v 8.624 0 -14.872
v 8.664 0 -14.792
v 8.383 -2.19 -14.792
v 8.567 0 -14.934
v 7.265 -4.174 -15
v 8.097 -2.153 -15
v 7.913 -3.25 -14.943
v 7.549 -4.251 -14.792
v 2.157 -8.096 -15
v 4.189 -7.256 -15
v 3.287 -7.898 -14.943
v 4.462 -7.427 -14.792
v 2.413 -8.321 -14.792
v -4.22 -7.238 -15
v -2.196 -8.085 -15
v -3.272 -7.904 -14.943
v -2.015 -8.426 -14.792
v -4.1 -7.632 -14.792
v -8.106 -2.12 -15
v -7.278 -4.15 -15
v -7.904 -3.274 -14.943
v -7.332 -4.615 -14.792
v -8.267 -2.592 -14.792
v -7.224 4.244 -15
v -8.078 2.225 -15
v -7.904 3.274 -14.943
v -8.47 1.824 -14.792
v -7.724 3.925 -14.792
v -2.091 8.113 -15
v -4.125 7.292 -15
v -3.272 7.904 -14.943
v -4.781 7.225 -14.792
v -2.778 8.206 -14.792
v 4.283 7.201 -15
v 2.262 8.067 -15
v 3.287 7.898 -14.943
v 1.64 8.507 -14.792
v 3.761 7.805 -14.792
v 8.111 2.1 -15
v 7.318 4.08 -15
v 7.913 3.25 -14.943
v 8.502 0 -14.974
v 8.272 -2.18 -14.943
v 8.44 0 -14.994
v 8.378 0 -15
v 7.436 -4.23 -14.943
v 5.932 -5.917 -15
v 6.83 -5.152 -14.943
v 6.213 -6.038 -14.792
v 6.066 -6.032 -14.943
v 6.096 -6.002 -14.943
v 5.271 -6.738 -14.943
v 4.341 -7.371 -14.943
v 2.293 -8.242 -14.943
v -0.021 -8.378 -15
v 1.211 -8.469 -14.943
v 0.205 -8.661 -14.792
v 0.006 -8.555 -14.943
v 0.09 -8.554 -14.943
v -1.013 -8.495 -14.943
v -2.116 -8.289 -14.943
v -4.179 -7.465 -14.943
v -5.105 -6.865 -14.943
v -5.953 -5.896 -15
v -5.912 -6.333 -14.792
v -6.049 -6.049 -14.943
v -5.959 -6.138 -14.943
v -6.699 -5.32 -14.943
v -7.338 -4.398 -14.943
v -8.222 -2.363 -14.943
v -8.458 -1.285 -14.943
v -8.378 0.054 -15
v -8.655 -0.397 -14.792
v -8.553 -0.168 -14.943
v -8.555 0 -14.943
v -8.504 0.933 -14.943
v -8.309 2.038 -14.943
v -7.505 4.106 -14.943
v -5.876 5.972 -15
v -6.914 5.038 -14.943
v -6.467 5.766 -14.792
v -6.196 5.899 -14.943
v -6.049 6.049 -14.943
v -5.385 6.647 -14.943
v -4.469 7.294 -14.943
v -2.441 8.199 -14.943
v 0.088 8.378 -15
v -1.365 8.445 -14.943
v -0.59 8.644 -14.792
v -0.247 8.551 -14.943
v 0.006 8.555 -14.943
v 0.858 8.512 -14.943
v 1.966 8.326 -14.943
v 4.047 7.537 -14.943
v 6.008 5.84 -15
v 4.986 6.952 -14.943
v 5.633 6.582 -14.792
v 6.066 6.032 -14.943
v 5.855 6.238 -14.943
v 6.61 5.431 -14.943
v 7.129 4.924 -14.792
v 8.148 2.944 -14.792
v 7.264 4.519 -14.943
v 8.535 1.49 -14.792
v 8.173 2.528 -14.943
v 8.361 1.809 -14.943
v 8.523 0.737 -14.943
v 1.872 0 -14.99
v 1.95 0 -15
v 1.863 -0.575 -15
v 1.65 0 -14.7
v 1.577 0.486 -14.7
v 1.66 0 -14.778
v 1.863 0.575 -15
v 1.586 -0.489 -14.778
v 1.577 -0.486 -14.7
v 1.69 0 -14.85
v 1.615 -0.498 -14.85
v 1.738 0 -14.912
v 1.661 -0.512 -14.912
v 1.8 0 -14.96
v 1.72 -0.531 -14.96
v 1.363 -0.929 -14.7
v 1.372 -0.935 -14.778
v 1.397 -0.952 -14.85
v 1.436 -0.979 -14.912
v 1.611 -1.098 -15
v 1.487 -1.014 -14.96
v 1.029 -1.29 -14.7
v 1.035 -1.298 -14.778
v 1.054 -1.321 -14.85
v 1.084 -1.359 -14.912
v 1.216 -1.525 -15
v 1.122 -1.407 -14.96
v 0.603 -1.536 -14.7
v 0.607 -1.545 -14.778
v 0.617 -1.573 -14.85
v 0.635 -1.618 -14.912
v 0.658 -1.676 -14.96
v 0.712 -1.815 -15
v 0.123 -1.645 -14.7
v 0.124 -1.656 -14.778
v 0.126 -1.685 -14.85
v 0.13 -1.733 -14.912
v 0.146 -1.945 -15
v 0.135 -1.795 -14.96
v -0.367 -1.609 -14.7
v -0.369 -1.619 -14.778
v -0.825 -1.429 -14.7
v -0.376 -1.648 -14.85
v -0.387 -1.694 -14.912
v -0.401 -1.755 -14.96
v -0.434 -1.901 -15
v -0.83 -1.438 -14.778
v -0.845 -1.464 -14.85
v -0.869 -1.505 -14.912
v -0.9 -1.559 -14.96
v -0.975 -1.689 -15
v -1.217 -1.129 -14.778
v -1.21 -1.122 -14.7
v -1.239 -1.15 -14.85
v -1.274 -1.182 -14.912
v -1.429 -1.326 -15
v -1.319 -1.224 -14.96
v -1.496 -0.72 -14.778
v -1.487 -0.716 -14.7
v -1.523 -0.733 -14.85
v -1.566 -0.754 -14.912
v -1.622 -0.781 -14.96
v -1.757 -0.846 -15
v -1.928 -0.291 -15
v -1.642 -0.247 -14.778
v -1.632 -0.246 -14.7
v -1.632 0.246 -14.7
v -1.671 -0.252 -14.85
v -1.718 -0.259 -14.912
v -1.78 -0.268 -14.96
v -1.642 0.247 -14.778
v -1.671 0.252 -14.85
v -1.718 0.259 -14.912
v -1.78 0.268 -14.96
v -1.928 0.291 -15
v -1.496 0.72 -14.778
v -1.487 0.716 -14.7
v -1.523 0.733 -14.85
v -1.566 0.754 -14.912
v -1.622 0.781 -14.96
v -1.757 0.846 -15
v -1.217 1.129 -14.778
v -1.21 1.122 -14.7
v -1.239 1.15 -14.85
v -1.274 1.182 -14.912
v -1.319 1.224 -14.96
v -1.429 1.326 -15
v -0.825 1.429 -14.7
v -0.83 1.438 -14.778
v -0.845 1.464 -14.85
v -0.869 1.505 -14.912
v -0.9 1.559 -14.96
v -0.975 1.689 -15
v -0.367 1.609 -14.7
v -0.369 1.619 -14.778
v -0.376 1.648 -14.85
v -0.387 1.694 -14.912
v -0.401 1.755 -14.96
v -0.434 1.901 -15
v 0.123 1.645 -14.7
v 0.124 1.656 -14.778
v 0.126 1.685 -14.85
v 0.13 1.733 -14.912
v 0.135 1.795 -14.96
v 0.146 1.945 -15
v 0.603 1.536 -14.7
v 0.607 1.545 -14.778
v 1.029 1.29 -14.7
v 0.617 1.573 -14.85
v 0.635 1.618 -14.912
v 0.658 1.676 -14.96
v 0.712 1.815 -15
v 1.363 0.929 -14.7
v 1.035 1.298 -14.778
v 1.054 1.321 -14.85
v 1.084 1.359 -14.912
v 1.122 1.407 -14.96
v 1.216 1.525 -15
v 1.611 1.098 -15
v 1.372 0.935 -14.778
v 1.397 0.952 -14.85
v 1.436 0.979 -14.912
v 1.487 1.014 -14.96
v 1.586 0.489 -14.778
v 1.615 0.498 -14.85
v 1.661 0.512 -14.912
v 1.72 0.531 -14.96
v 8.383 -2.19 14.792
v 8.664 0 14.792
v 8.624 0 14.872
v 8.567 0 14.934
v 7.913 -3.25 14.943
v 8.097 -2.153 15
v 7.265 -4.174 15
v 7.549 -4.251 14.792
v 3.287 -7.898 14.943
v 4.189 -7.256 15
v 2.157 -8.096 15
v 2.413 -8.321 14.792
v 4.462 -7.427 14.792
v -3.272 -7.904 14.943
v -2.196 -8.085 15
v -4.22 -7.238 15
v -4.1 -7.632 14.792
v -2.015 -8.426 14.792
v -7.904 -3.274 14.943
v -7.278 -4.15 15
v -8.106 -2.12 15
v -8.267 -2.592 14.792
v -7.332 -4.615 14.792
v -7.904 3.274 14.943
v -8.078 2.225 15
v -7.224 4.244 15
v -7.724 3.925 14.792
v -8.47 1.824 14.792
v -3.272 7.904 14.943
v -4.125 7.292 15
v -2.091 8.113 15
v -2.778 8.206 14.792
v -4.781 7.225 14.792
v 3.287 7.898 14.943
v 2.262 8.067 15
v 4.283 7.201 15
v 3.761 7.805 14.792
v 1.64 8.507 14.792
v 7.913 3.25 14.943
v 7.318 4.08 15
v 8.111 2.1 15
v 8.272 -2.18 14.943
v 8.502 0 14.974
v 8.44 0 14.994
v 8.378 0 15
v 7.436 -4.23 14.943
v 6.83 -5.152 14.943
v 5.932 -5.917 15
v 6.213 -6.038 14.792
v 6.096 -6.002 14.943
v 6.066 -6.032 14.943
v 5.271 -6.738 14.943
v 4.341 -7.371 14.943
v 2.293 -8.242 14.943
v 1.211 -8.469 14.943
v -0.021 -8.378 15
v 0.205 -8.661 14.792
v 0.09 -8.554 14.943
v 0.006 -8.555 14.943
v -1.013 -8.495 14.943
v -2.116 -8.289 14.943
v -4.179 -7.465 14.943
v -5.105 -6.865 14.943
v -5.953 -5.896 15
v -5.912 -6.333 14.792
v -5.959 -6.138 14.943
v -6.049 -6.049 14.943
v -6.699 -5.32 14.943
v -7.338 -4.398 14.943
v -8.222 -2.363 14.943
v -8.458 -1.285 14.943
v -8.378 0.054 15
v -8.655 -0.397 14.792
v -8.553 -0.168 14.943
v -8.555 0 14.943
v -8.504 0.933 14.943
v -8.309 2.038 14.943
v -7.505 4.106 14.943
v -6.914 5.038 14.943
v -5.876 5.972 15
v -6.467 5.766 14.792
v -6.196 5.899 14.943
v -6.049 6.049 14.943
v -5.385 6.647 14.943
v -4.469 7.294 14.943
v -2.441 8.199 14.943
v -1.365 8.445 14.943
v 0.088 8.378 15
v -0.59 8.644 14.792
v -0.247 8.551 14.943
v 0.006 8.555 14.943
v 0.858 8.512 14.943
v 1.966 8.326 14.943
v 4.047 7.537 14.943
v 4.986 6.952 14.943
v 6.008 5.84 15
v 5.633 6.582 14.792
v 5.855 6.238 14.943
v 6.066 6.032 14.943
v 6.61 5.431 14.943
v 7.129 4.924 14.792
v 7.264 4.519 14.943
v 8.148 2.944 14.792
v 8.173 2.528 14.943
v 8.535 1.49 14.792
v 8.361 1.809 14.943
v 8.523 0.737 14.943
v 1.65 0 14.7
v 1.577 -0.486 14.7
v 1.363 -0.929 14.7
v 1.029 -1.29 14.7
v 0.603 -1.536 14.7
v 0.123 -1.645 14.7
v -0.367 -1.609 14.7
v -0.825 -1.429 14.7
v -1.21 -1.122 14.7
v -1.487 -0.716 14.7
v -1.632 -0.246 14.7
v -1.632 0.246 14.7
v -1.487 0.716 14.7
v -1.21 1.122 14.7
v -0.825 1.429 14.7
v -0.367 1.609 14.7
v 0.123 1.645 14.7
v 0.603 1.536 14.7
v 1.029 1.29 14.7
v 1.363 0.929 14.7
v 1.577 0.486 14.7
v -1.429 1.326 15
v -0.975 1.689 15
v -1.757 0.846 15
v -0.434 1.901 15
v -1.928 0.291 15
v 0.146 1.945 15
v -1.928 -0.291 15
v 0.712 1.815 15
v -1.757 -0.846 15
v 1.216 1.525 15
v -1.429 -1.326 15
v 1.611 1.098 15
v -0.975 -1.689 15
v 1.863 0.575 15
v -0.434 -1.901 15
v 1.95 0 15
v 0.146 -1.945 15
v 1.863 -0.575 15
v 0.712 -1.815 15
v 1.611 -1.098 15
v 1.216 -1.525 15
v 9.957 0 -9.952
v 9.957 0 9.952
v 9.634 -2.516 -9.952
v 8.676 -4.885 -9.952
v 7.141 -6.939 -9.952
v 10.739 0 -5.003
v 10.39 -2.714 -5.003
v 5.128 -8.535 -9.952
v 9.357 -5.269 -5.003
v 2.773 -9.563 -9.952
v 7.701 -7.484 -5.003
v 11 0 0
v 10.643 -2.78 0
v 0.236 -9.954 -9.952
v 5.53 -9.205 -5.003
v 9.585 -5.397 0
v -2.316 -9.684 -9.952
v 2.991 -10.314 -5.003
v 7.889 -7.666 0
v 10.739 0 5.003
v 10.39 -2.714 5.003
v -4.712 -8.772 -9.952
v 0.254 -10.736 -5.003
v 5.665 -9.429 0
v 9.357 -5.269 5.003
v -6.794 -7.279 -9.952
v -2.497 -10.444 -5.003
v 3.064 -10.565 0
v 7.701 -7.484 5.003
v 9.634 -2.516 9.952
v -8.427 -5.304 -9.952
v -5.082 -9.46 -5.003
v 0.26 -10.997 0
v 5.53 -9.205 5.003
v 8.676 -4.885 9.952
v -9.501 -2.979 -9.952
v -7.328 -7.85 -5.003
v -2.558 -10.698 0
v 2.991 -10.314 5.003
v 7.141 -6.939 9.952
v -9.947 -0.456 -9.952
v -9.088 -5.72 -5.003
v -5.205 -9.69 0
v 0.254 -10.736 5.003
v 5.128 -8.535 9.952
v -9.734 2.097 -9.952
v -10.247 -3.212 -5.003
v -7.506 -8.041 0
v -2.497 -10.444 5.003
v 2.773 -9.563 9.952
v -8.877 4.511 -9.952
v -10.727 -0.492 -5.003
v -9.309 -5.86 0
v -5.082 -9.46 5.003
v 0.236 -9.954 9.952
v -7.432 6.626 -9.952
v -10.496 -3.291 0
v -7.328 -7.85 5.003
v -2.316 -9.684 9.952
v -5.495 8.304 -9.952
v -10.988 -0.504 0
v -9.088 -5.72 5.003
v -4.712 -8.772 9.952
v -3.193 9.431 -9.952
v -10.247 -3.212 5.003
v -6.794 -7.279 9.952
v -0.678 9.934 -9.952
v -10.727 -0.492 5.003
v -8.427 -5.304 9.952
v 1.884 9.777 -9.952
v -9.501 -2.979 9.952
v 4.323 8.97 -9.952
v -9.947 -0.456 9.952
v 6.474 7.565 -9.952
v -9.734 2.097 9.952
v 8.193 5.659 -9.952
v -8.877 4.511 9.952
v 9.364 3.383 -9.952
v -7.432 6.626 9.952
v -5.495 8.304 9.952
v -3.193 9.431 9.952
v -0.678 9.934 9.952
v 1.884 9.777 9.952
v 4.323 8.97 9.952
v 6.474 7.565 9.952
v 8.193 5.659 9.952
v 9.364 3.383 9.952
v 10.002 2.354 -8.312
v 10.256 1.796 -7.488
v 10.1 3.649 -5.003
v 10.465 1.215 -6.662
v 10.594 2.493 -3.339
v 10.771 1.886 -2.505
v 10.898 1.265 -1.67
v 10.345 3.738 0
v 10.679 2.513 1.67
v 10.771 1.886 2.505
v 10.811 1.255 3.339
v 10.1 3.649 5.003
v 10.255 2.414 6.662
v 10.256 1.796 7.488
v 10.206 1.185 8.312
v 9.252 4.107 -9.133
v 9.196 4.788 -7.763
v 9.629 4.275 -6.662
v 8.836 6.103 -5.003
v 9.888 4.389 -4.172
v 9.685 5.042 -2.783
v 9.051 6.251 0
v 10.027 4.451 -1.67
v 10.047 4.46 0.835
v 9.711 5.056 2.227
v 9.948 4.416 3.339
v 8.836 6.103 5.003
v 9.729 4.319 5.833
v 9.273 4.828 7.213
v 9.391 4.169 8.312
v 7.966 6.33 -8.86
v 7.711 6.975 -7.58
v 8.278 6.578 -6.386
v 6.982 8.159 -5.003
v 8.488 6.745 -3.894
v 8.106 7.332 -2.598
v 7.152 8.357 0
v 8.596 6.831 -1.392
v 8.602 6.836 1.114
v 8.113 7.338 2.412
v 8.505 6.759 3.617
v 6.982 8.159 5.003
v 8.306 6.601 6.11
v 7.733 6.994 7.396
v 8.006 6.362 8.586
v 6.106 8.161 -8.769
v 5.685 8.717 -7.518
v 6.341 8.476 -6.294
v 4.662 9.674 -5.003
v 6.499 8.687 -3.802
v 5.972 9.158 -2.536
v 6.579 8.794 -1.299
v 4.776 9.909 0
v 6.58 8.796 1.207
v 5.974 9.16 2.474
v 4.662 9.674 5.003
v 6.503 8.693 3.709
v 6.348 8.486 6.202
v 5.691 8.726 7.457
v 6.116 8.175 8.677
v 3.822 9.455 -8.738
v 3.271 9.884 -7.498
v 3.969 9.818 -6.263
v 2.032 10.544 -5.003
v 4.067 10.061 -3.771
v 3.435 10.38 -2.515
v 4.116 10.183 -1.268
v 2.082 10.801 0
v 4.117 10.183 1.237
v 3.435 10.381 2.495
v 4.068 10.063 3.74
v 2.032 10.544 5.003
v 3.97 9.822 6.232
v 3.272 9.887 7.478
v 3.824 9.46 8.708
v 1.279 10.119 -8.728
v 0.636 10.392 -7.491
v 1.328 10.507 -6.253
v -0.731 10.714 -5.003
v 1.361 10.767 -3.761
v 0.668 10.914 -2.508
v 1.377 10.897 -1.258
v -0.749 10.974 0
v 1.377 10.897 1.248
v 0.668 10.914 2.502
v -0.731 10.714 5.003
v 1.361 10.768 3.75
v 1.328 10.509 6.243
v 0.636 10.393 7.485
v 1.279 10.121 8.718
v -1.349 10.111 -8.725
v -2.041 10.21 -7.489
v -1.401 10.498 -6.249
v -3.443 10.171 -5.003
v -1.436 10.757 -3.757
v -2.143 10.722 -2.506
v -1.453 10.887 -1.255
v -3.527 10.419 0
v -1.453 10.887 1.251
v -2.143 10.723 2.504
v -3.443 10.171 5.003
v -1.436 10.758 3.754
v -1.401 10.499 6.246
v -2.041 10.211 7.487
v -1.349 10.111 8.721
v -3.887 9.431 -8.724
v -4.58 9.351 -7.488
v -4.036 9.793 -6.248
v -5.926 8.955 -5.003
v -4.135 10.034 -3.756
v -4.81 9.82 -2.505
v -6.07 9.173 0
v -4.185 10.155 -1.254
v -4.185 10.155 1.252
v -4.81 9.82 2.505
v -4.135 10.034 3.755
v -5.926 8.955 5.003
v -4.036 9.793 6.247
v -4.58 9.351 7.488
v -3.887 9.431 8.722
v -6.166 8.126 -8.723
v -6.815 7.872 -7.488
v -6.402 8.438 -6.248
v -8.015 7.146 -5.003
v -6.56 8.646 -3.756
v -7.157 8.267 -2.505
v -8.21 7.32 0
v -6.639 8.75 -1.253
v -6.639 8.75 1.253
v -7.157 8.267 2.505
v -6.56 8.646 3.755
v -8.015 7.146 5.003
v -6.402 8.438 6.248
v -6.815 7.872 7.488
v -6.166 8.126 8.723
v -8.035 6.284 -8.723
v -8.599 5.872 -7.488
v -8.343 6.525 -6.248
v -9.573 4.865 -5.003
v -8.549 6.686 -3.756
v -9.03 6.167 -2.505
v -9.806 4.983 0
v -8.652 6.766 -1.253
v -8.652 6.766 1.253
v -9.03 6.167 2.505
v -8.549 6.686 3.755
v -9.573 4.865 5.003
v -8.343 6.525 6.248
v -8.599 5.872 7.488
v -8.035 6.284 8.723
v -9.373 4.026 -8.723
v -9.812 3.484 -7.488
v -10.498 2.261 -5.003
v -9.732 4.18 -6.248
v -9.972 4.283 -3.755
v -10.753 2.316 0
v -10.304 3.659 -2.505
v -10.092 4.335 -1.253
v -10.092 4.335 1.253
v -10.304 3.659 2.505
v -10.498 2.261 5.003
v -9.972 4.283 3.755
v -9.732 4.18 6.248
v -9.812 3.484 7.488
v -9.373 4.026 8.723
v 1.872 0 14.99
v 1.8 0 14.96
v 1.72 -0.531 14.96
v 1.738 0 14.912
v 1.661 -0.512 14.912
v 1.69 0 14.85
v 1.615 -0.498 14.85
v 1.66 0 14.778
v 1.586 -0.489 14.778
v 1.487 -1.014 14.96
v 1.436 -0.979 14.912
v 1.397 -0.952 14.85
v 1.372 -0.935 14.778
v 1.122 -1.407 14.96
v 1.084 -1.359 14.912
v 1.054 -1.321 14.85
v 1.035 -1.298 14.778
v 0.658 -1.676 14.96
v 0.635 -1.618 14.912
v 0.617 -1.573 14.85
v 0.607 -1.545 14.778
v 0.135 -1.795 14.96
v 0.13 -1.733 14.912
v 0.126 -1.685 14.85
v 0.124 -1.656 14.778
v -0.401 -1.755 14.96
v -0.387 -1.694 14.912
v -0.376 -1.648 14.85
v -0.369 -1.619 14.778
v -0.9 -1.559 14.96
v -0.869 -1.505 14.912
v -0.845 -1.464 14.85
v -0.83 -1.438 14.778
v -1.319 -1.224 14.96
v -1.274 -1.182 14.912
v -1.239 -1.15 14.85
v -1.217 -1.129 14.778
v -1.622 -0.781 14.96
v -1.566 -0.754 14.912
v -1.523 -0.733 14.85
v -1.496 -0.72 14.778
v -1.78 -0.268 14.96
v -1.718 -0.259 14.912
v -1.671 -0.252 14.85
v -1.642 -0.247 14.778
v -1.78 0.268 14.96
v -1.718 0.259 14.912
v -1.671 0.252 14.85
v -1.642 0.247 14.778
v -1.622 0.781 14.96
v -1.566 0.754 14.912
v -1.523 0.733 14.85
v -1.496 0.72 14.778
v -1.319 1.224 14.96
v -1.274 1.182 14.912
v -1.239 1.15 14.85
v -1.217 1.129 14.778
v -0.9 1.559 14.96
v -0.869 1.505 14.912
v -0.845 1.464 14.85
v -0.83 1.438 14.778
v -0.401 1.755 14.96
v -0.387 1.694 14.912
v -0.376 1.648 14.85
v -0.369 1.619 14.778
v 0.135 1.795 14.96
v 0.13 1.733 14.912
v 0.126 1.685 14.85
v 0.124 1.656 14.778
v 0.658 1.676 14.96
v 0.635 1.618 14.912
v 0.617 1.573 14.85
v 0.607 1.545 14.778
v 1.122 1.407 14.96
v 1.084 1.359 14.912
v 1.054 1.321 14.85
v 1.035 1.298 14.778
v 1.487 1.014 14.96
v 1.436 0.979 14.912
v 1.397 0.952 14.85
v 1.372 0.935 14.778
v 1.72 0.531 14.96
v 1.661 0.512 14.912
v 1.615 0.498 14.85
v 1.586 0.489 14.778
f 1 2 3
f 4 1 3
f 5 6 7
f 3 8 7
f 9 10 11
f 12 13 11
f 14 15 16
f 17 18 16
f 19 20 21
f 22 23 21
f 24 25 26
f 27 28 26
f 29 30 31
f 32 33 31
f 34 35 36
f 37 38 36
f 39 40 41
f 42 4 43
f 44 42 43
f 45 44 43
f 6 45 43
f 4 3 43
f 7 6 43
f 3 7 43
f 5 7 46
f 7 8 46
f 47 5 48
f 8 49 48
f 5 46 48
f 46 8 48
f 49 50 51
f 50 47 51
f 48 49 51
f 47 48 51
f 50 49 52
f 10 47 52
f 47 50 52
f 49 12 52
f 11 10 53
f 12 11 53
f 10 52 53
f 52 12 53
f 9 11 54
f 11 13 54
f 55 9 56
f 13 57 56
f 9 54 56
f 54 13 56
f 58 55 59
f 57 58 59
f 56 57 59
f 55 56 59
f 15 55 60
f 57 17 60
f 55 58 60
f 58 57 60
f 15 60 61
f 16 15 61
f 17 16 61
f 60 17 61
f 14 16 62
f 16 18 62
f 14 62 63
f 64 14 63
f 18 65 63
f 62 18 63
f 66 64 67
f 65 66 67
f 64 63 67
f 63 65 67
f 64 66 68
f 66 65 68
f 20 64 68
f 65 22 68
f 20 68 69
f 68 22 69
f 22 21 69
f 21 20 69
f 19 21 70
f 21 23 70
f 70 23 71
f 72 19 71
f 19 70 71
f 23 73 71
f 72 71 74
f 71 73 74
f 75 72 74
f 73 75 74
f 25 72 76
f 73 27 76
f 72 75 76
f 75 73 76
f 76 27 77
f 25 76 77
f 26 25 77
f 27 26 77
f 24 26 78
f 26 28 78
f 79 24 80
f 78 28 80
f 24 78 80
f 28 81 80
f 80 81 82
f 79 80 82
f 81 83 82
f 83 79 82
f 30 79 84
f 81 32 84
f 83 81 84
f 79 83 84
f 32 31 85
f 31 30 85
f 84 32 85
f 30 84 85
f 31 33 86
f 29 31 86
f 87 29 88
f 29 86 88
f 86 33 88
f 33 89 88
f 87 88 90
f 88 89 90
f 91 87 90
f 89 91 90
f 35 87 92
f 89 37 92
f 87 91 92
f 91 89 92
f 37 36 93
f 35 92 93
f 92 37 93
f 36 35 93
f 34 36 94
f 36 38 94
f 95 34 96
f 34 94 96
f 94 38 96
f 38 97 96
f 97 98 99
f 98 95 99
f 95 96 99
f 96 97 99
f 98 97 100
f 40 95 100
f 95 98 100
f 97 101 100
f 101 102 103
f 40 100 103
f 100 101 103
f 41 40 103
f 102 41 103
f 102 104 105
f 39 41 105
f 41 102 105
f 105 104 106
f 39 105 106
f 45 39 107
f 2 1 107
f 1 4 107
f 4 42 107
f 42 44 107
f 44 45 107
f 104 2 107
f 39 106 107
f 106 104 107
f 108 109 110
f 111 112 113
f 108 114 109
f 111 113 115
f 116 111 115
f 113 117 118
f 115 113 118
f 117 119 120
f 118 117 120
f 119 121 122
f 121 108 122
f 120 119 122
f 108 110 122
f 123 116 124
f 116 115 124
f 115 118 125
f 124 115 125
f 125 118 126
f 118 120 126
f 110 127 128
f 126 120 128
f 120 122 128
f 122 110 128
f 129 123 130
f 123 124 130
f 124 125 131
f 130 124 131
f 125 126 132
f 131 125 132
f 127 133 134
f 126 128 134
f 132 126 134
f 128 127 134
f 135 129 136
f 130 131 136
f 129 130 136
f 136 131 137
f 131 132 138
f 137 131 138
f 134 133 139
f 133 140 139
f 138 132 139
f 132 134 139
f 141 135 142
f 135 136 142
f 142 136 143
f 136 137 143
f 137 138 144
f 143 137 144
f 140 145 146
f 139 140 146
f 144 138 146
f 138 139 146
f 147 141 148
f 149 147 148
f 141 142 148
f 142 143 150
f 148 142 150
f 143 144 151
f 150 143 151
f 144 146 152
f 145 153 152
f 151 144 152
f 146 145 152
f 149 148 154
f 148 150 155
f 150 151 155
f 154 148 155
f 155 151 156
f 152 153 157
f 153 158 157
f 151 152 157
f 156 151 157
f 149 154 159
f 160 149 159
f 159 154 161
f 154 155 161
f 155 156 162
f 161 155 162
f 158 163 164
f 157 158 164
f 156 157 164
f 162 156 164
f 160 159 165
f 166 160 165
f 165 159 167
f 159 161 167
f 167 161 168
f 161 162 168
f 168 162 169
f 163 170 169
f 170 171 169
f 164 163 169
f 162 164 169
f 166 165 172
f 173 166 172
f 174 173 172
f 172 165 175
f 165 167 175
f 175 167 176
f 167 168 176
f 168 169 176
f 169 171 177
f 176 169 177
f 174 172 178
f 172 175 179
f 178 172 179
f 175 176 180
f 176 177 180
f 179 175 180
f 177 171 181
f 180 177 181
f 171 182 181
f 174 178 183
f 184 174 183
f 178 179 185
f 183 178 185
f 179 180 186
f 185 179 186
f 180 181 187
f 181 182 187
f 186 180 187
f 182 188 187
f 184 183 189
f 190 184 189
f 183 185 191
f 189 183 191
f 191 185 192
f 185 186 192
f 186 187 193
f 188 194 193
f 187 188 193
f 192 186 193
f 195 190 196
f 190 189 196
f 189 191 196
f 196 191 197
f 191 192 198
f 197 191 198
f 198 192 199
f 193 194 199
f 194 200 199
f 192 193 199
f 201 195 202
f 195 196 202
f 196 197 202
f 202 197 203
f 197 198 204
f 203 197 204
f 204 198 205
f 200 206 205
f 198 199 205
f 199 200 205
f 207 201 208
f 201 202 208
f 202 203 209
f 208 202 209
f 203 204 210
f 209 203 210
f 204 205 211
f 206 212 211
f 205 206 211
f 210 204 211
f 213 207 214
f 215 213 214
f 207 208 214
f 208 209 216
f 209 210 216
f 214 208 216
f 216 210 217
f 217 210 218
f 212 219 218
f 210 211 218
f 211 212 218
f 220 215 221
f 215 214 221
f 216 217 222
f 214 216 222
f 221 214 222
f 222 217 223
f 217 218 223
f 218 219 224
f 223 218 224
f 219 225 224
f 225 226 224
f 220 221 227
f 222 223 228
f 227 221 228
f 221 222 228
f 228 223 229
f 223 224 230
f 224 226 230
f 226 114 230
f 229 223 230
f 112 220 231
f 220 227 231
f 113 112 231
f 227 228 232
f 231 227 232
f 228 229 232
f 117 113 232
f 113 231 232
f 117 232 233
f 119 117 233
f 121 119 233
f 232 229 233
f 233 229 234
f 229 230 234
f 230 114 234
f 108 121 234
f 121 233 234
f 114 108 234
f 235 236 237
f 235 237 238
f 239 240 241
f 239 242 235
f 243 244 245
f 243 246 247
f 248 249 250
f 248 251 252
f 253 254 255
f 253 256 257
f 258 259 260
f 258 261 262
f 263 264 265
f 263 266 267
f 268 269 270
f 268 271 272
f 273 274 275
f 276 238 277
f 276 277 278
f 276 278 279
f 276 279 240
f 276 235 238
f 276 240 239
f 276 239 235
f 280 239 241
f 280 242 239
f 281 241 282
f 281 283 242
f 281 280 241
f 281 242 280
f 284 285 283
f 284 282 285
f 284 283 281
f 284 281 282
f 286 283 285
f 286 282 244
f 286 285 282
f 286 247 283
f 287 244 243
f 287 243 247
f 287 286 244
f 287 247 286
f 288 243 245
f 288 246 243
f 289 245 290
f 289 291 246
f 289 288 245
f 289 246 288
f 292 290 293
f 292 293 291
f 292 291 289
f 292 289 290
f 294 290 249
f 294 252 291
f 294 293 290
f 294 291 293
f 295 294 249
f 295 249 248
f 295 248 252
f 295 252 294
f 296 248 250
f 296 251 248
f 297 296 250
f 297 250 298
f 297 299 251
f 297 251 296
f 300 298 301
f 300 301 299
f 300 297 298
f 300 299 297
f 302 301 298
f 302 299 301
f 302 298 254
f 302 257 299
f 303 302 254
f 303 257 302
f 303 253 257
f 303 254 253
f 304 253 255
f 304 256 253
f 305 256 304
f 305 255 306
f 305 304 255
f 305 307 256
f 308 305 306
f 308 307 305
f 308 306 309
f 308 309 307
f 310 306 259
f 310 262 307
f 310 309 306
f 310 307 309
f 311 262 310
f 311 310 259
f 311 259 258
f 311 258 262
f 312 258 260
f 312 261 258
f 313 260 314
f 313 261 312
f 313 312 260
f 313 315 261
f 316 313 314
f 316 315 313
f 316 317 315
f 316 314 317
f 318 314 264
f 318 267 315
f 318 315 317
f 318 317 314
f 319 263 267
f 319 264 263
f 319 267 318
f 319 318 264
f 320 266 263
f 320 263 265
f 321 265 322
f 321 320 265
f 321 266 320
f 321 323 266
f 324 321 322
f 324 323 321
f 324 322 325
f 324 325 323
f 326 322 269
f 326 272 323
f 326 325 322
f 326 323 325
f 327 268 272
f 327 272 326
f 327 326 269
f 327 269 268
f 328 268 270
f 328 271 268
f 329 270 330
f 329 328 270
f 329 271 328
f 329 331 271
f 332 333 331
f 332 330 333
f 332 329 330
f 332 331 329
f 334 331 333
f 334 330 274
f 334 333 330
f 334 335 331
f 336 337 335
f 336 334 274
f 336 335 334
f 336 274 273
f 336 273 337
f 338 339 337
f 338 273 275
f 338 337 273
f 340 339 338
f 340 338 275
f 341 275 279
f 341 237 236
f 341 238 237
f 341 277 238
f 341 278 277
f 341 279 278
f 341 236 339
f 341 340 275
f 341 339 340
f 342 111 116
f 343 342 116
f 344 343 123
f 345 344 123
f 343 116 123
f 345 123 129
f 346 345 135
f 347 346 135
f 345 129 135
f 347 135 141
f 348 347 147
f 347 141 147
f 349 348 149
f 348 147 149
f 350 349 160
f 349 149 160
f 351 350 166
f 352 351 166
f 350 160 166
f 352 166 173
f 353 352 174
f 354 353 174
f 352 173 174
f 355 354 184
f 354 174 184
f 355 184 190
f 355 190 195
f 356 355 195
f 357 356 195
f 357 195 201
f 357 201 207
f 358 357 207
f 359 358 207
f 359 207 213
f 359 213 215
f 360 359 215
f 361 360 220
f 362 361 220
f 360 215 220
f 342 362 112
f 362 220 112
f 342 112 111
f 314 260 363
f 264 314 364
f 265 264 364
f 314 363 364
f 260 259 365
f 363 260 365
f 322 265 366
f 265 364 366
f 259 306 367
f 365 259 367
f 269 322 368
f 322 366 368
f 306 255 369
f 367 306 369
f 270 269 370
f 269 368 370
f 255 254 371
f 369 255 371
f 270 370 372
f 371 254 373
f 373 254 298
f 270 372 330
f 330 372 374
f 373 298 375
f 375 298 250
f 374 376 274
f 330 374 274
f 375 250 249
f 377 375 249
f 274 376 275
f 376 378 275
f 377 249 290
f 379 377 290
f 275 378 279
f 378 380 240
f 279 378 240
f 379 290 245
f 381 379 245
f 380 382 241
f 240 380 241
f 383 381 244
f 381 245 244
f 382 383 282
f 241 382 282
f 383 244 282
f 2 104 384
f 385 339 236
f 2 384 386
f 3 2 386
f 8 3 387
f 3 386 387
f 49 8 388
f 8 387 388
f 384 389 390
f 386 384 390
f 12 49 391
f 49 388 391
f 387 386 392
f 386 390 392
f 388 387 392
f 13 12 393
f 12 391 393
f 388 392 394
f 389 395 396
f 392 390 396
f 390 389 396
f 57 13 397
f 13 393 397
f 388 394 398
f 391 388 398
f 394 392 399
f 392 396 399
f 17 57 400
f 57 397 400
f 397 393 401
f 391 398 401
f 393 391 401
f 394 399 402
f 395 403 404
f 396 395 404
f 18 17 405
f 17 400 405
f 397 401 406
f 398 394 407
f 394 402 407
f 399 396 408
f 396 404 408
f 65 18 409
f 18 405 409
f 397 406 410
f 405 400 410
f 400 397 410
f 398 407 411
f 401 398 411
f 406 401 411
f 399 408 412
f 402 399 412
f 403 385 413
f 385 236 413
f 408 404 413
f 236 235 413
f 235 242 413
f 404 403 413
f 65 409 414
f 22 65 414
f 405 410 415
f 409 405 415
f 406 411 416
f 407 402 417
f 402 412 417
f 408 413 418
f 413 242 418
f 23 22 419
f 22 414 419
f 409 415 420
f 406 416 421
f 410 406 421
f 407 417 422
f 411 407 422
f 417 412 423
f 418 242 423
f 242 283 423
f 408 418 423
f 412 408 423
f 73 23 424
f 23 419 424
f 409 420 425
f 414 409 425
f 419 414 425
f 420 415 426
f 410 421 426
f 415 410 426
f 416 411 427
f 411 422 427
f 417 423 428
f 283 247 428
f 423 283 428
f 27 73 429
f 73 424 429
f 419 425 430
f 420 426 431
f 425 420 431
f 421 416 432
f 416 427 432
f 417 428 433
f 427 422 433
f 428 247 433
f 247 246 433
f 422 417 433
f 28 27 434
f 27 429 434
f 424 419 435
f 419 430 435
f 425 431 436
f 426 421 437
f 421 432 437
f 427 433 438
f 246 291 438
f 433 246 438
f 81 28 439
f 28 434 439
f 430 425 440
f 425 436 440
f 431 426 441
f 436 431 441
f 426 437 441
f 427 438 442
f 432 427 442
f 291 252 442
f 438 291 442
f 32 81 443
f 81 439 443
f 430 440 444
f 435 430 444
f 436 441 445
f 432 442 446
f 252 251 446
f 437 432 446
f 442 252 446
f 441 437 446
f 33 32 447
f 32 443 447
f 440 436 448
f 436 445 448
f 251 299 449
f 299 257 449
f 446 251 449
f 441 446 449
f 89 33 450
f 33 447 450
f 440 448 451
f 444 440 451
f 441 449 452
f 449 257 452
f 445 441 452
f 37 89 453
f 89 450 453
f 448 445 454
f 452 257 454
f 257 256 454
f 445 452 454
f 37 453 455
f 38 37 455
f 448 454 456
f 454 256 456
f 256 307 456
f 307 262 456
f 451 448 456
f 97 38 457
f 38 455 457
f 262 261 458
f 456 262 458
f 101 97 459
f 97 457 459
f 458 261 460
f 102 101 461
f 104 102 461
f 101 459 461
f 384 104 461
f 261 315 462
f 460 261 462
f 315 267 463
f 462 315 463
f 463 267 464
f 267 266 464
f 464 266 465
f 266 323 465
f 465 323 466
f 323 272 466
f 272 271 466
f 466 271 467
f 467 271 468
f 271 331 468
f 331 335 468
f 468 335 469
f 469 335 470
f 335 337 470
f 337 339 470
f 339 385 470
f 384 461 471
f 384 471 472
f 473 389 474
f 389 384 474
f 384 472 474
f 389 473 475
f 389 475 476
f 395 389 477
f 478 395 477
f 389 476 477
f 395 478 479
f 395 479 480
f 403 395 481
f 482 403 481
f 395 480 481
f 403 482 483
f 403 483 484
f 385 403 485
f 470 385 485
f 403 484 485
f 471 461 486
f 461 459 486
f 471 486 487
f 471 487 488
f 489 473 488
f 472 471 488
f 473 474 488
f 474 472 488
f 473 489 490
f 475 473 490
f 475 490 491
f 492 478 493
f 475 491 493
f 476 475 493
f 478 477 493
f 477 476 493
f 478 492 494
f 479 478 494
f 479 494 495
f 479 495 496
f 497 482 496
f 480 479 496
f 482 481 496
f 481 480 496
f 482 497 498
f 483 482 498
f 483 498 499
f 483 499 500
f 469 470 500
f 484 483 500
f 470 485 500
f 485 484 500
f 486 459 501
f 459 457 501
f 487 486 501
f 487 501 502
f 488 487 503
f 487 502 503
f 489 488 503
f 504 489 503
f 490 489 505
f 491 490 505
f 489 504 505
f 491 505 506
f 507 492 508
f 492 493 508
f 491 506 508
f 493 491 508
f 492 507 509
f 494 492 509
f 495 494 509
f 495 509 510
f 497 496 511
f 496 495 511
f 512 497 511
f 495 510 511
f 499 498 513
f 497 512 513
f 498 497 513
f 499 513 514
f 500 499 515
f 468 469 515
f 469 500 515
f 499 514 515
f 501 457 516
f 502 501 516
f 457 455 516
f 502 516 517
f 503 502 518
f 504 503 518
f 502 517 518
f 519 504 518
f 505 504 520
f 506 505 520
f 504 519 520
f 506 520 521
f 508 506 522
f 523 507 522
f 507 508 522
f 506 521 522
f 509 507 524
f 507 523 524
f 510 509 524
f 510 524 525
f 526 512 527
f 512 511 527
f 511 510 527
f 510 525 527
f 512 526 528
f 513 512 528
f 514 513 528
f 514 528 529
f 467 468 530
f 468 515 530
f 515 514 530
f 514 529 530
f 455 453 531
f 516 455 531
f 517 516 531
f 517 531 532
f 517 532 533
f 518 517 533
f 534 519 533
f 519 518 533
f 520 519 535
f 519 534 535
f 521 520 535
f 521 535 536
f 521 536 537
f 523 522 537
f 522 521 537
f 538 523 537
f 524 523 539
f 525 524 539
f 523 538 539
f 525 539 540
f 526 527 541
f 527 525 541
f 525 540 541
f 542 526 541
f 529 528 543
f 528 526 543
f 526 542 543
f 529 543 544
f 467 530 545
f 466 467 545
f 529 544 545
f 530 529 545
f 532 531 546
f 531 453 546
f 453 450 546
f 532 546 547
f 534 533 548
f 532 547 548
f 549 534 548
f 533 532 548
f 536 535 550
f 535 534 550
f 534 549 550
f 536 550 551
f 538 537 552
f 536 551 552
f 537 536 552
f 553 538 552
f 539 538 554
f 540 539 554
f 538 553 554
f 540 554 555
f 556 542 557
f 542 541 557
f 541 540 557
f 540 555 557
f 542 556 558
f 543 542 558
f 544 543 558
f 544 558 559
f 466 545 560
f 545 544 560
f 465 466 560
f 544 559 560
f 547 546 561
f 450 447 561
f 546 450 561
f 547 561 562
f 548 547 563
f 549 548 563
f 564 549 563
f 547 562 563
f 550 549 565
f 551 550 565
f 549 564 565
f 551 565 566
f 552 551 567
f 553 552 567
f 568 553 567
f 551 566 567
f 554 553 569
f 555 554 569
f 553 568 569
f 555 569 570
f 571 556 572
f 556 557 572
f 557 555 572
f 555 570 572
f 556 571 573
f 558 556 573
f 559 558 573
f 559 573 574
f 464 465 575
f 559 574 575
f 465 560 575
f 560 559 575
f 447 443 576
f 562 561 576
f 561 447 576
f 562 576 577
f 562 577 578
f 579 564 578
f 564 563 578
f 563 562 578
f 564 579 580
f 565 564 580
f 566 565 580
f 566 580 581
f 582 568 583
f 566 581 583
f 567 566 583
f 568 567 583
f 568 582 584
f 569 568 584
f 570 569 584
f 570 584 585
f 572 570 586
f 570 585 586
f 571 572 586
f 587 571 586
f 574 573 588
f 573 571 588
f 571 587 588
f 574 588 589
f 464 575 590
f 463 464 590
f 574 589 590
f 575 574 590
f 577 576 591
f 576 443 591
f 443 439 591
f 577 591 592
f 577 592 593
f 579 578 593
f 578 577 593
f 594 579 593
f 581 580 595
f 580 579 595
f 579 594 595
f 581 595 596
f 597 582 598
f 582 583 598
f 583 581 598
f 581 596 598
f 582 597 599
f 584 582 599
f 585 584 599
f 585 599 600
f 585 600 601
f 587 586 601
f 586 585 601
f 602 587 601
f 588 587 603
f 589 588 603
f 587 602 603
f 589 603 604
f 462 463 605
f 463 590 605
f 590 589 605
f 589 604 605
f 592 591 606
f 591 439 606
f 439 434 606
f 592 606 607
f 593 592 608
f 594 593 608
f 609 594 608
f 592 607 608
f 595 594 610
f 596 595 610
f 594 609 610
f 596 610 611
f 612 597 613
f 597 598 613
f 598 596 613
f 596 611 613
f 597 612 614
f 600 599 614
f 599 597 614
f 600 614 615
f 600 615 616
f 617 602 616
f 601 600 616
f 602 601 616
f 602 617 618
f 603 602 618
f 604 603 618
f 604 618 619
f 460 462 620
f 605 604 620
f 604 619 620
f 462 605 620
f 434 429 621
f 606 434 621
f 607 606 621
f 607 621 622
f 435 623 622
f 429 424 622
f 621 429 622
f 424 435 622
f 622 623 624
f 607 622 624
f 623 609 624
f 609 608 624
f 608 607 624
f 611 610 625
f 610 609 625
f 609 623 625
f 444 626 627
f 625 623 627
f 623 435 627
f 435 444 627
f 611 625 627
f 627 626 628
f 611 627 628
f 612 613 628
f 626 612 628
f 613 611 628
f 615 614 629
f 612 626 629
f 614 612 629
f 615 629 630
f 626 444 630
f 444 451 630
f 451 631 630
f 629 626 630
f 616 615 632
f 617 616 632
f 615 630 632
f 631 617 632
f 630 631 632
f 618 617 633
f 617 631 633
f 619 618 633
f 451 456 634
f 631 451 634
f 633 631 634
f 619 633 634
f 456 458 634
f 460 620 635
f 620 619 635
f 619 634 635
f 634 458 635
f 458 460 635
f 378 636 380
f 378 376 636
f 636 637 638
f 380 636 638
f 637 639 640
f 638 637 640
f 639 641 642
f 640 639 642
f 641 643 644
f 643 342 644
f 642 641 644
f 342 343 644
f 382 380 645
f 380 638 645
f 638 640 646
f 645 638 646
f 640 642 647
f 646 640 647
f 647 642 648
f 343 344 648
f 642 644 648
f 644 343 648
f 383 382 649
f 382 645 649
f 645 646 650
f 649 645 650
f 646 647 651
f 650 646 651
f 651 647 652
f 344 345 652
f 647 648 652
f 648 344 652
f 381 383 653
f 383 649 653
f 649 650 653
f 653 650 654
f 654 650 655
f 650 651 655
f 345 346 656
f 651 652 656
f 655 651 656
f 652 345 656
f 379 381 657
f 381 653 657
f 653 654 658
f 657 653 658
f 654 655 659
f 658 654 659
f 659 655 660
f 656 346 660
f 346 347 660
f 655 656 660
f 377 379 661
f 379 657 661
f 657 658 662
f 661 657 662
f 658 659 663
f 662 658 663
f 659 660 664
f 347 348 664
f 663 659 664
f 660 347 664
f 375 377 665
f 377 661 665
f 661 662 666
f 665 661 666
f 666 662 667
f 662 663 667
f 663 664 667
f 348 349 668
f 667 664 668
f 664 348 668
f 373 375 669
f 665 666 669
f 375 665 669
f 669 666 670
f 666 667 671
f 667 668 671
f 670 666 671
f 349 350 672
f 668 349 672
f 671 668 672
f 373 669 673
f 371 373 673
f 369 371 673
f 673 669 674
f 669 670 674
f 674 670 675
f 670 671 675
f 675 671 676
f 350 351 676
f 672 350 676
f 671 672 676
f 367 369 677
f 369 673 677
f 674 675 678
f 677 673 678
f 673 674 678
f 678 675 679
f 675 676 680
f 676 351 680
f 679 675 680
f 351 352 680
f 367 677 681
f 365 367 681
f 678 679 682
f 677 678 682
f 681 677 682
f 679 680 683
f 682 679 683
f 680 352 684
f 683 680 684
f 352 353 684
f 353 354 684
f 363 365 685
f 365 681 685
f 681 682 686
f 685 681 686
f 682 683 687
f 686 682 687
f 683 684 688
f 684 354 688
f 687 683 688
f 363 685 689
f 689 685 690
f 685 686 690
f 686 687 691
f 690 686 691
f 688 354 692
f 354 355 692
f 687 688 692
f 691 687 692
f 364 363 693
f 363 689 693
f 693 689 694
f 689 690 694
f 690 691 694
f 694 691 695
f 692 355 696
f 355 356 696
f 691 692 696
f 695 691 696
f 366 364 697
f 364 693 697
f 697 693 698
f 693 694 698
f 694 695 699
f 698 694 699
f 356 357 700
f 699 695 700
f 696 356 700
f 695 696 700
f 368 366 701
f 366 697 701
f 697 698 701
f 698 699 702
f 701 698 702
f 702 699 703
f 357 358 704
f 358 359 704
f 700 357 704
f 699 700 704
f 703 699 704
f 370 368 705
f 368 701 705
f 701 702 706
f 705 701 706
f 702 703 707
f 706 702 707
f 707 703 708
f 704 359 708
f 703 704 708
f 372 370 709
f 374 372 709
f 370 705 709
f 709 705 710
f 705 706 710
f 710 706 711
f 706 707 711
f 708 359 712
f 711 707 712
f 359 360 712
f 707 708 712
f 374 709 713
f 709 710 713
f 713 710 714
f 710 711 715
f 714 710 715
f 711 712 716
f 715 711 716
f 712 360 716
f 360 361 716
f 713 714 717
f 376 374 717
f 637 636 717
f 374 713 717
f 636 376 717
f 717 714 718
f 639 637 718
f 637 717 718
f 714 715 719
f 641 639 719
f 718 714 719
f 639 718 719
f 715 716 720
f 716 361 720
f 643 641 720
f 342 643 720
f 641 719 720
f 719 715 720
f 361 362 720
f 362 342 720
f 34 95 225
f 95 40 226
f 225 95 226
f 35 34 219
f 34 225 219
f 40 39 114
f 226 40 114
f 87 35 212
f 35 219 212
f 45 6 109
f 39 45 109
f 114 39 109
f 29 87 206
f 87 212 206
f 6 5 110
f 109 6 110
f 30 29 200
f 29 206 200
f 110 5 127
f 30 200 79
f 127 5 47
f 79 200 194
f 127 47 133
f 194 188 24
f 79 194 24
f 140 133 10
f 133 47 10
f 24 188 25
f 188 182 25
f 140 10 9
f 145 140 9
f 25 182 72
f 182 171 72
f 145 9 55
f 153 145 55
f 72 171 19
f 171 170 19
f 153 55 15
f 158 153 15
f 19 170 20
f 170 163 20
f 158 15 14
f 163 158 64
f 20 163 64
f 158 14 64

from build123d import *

# Parameters (mm, degrees)
VERRUNDUNG1_R = 0.3


with BuildPart() as part:
    # Skizze1 → Rotation3 (revolve)
    with BuildSketch(Plane(origin=(0, 0, 0), x_dir=(0, 0, -1), z_dir=(1, 0, 0)), mode=Mode.PRIVATE) as rotation3_sk:
        with BuildLine():
            ThreePointArc((15, 8.596052461), (0, 11), (-15, 8.596052461))
            Line((-15, 8.596052461), (-15, 1.65))
            Line((-15, 1.65), (15, 1.65))
            Line((15, 1.65), (15, 8.596052461))
        make_face()
    revolve(rotation3_sk.sketch.rotate(Axis((0, 0, 31.772981832), (0, 0, -1)), 90), axis=Axis((0, 0, 31.772981832), (0, 0, -1)))

    # Verrundung1
    verrundung1_edges = [part.edges().sort_by_distance(p)[0] for p in [
        (-1.65, 0, -15),
        (-1.65, 0, 15),
        (-8.596052461, 0, 15),
        (-8.596052461, 0, -15),
    ]]
    fillet(verrundung1_edges, radius=VERRUNDUNG1_R)


solid = part.part
